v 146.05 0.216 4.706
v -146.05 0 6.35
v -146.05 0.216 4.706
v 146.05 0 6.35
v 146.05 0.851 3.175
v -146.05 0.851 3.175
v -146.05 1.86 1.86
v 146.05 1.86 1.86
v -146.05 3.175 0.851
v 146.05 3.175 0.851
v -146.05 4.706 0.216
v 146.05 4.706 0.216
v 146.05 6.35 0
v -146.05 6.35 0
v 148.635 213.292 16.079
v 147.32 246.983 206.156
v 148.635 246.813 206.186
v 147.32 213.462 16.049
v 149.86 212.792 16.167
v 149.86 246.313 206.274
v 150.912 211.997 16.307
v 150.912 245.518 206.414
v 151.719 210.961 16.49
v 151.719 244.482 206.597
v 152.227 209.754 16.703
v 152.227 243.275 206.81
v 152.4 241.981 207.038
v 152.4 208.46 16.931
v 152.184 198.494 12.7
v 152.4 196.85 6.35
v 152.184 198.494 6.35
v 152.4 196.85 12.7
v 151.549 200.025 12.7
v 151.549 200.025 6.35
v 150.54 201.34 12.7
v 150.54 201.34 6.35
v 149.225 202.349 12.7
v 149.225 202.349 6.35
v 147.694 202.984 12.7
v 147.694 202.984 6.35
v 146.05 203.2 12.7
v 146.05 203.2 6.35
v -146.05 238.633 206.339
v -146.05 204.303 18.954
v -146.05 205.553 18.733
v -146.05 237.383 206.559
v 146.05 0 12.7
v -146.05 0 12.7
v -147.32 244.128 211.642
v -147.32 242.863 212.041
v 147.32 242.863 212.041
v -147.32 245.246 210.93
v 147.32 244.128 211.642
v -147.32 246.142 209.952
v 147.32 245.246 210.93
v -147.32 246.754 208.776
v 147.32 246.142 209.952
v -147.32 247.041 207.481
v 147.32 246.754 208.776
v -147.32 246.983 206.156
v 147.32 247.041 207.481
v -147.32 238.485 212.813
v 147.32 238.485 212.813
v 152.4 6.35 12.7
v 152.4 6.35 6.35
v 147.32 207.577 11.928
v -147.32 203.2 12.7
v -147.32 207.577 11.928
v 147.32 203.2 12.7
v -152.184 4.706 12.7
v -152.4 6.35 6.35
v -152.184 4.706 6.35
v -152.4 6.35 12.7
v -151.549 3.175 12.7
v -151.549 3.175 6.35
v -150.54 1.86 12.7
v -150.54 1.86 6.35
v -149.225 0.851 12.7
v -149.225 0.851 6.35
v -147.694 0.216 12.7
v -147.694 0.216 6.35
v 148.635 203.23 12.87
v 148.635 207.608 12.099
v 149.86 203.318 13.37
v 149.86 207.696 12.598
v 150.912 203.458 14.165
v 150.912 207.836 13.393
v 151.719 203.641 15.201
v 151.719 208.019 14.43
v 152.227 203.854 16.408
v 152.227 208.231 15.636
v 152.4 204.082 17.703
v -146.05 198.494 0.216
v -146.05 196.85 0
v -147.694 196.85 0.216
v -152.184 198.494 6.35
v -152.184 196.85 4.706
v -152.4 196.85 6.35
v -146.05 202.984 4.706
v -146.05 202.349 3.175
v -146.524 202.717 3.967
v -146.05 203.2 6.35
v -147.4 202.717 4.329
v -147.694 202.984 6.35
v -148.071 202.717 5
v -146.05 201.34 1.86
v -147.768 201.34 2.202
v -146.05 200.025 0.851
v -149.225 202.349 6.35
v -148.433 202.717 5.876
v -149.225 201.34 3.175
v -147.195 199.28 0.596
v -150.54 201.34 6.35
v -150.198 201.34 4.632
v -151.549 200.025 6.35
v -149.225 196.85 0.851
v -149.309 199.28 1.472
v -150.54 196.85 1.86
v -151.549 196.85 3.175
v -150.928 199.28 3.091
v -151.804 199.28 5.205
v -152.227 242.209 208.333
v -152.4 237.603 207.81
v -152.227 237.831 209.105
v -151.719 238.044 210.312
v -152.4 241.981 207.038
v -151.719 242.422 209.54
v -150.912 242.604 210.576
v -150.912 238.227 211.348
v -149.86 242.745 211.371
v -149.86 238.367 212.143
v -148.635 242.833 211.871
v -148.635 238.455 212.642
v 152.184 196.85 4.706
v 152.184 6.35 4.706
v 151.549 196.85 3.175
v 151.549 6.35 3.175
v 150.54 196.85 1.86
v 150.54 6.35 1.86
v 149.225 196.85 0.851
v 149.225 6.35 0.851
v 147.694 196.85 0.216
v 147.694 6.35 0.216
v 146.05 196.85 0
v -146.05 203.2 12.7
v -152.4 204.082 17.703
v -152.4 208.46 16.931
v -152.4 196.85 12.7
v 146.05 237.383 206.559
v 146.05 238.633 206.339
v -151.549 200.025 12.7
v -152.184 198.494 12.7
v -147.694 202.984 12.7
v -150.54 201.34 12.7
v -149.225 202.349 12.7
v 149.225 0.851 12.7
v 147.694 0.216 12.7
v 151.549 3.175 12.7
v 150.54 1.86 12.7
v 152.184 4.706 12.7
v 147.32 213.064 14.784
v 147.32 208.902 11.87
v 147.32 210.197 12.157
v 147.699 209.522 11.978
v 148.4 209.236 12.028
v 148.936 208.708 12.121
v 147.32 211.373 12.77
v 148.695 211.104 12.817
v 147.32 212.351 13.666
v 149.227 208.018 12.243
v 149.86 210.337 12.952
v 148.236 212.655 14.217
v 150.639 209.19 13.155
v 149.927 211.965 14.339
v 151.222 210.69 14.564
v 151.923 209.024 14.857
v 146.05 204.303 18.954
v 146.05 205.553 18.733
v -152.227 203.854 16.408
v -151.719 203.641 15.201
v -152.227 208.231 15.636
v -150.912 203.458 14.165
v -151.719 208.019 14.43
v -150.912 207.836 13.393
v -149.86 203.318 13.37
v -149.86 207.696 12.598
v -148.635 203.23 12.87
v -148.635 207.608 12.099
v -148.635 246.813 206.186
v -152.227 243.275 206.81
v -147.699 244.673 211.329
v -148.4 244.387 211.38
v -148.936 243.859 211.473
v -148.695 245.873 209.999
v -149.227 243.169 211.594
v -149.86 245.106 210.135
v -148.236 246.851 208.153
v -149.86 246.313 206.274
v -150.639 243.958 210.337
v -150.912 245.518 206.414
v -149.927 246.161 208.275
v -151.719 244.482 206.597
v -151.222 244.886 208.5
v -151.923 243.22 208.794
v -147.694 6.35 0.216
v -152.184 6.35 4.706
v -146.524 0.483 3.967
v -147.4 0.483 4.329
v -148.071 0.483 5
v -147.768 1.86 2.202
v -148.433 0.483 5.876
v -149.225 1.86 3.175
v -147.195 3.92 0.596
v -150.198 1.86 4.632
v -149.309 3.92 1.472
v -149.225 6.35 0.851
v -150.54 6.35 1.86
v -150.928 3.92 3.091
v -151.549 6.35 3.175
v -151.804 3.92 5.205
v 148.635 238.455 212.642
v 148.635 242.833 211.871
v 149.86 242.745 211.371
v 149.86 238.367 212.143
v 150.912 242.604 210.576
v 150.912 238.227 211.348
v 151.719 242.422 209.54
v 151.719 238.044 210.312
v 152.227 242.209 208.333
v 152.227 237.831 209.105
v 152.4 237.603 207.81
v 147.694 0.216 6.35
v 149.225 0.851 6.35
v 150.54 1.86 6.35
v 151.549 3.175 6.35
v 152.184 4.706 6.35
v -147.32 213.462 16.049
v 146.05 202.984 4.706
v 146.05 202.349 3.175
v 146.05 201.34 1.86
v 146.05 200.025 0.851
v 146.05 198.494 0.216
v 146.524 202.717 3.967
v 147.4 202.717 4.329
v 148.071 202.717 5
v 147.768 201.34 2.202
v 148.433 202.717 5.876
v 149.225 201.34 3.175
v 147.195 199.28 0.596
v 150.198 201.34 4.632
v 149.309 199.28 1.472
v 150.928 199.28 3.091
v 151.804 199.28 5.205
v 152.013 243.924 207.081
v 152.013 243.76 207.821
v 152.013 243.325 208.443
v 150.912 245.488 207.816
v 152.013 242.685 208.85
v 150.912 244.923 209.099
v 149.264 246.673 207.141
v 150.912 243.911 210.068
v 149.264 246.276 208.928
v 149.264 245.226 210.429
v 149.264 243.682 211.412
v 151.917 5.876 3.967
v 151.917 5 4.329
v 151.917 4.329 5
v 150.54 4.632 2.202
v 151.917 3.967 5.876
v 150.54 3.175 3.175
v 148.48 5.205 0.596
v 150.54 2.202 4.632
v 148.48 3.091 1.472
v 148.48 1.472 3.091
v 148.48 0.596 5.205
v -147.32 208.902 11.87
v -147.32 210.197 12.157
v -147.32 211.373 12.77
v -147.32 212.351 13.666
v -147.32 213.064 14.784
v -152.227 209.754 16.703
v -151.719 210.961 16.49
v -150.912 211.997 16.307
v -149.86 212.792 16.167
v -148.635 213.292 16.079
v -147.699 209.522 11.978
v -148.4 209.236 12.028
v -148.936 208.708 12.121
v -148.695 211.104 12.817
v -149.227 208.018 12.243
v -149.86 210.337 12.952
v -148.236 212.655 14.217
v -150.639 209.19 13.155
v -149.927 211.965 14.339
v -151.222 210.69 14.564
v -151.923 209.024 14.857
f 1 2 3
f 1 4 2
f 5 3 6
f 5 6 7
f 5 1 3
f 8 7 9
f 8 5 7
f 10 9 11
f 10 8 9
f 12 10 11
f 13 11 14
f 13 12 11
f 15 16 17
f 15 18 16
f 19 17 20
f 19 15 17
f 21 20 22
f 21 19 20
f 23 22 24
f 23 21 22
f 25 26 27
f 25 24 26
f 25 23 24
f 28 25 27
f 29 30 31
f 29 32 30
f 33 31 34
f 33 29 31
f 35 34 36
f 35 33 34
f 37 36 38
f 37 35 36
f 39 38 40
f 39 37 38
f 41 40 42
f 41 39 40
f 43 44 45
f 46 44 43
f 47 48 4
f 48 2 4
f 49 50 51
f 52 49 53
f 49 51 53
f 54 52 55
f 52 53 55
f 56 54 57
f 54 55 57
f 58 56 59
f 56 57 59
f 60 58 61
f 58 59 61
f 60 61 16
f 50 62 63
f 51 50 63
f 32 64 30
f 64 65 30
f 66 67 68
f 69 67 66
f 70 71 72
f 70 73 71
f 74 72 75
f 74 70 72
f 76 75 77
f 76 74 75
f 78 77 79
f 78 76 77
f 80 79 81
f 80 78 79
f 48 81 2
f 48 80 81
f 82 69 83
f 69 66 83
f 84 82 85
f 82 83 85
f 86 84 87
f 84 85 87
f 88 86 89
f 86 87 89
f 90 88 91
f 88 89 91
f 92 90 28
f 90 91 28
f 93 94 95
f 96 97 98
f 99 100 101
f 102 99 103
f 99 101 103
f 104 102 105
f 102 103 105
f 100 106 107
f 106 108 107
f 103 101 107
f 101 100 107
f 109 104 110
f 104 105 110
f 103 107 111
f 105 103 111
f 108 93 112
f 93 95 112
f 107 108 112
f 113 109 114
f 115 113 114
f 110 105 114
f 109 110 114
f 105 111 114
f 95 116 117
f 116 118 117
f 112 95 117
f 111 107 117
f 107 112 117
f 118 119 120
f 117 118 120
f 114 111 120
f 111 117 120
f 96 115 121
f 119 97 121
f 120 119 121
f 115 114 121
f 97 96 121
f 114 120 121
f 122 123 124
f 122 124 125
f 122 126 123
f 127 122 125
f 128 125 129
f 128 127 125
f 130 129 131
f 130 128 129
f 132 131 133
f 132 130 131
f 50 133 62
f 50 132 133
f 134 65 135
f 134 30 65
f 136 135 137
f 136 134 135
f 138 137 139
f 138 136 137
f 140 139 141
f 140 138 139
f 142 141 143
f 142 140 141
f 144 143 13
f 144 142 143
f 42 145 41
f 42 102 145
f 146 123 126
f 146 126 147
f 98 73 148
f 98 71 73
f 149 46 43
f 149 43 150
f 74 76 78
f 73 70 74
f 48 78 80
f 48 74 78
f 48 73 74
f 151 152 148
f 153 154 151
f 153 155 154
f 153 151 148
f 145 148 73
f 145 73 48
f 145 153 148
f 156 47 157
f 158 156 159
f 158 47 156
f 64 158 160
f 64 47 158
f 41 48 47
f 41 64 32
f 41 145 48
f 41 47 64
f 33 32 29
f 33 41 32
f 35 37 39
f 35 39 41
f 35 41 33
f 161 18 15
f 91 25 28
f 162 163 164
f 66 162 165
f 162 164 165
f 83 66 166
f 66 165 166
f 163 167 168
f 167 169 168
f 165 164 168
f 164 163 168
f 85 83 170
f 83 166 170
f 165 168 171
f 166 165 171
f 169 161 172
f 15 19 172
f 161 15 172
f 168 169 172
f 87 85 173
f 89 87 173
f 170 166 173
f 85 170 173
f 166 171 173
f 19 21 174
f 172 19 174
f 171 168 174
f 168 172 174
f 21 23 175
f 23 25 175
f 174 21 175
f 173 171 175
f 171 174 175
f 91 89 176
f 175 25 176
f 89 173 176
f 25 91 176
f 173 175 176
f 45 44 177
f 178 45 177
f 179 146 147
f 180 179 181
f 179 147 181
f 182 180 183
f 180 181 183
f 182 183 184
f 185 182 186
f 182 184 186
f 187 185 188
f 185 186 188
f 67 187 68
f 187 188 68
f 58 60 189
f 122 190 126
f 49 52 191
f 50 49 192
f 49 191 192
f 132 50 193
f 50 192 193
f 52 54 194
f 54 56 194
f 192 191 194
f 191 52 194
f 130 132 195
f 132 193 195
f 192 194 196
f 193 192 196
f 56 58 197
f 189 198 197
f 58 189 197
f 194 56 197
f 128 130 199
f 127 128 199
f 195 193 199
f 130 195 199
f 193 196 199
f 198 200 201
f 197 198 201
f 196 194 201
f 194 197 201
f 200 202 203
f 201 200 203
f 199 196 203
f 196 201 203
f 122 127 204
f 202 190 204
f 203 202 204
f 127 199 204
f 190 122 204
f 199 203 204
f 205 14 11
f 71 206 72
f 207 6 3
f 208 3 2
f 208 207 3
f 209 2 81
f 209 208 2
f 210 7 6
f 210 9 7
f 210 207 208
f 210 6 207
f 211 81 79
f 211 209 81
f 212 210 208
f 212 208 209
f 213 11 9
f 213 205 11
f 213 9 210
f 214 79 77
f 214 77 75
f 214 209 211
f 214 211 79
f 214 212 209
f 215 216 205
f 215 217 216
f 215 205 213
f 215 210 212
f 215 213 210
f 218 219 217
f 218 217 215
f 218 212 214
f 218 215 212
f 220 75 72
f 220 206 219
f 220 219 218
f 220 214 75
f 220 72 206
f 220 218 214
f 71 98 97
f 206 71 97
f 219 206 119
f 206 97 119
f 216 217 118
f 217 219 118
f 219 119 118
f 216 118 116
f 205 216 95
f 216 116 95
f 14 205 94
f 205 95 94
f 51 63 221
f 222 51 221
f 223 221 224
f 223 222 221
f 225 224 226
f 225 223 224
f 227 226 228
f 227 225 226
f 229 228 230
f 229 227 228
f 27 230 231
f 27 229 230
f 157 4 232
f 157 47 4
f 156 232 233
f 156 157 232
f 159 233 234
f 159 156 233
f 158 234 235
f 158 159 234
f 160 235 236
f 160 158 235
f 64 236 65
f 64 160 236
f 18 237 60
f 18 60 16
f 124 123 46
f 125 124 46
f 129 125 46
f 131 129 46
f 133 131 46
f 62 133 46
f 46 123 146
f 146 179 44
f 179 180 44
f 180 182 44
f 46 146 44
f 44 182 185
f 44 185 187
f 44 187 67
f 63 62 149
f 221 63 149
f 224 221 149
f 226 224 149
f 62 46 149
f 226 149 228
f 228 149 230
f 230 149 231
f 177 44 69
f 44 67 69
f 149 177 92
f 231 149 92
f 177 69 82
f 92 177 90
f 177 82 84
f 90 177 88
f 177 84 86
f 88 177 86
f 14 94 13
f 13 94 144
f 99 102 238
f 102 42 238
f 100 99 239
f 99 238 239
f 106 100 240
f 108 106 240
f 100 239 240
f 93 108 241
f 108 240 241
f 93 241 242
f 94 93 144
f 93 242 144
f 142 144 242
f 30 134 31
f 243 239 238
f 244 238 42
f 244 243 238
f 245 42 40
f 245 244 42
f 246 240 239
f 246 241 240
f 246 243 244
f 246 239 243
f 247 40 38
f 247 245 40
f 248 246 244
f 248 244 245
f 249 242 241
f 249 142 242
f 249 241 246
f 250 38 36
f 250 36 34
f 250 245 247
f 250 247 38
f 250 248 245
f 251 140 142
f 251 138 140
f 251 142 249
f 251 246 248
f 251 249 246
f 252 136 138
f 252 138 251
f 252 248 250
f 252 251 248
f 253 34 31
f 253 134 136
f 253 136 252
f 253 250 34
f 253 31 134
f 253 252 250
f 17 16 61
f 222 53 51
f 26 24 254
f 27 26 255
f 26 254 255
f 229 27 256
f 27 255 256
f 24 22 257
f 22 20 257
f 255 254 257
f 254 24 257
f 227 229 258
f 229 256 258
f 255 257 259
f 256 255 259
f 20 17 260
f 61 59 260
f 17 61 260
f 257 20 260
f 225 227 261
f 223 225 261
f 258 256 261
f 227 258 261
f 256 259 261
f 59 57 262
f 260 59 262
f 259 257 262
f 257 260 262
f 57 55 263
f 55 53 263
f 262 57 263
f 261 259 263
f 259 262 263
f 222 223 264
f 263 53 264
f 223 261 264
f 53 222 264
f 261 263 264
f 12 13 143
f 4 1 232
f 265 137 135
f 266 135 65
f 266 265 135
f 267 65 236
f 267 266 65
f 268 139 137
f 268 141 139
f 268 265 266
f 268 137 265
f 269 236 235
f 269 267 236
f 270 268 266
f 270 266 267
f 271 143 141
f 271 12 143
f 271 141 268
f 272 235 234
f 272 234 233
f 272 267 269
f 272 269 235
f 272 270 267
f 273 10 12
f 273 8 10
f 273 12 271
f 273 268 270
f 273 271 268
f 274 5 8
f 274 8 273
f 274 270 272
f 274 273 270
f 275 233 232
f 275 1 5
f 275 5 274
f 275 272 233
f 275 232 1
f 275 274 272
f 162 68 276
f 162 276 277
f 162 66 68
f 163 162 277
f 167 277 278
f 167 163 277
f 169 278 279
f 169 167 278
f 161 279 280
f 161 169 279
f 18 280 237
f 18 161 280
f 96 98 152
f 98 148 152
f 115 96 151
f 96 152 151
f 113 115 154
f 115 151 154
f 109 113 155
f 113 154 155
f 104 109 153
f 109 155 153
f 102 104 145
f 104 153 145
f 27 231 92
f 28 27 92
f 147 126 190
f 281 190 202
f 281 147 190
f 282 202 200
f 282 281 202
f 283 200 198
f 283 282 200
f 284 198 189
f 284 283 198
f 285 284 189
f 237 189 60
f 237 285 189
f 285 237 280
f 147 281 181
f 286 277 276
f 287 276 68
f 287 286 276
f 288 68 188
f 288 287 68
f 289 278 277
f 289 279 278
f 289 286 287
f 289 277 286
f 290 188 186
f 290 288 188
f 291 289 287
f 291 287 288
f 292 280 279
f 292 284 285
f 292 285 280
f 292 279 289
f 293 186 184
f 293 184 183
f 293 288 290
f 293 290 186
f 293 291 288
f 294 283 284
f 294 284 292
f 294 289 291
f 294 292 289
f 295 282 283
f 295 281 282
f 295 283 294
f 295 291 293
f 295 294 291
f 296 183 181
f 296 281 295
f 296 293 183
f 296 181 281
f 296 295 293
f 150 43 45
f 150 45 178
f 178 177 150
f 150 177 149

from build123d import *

# Parameters (mm, degrees)
F0_W     = 304.8
F0_H     = 203.2
F1_DEPTH = 12.7
F2_W     = 304.8
F2_H     = 203.2
F3_DEPTH = 9.525
F4_ANGLE = -100
F5_W     = 292.1
F5_H     = 190.5
F6_DEPTH = 1.27
F7_R     = 6.35
F8_R     = 5.08


with BuildPart() as f1:
    # F0 (on Top) → F1 (new body)
    with BuildSketch(Plane.XY):
        with Locations((0, 101.6)):
            Rectangle(F0_W, F0_H)
    extrude(amount=F1_DEPTH)

    # F7
    f7_edges = [f1.edges().sort_by_distance(p)[0] for p in [
        (-152.4, 101.6, 0),
        (0, 0, 0),
        (152.4, 101.6, 0),
        (0, 203.2, 0),
        (152.4, 0, 6.35),
        (152.4, 203.2, 6.35),
        (-152.4, 0, 6.35),
        (-152.4, 203.2, 6.35),
    ]]
    fillet(f7_edges, radius=F7_R)


with BuildPart() as f3:
    # F2 (on face) → F3 (new body)
    with BuildSketch(Plane.XY.offset(12.7)):
        with Locations((0, 101.6)):
            Rectangle(F2_W, F2_H)
    extrude(amount=F3_DEPTH)


with BuildPart() as f3_1:
    # F4: moved
    add(f3.part.rotate(Axis((0, 203.2, 12.7), (1, 0, 0)), F4_ANGLE))

    # F5 (on face) → F6 (cut)
    with BuildSketch(Plane(origin=(0, 194.9009423617, -34.3662947039), x_dir=(1, 0, 0), z_dir=(0, -0.984807753, 0.1736481777))):
        with Locations((0, 149.3923681652)):
            Rectangle(F5_W, F5_H)
    extrude(amount=-F6_DEPTH, mode=Mode.SUBTRACT)

    # F8
    f8_edges = [f3_1.edges().sort_by_distance(p)[0] for p in [
        (-152.4, 230.222949, 111.102469),
        (0, 247.865604, 211.158937),
        (152.4, 230.222949, 111.102469),
        (0, 212.580294, 11.046001),
        (152.4, 243.175457, 211.985936),
        (152.4, 207.890147, 11.873001),
        (-152.4, 243.175457, 211.985936),
        (-152.4, 207.890147, 11.873001),
    ]]
    fillet(f8_edges, radius=F8_R)


solid = Compound([f1.part, f3_1.part])
